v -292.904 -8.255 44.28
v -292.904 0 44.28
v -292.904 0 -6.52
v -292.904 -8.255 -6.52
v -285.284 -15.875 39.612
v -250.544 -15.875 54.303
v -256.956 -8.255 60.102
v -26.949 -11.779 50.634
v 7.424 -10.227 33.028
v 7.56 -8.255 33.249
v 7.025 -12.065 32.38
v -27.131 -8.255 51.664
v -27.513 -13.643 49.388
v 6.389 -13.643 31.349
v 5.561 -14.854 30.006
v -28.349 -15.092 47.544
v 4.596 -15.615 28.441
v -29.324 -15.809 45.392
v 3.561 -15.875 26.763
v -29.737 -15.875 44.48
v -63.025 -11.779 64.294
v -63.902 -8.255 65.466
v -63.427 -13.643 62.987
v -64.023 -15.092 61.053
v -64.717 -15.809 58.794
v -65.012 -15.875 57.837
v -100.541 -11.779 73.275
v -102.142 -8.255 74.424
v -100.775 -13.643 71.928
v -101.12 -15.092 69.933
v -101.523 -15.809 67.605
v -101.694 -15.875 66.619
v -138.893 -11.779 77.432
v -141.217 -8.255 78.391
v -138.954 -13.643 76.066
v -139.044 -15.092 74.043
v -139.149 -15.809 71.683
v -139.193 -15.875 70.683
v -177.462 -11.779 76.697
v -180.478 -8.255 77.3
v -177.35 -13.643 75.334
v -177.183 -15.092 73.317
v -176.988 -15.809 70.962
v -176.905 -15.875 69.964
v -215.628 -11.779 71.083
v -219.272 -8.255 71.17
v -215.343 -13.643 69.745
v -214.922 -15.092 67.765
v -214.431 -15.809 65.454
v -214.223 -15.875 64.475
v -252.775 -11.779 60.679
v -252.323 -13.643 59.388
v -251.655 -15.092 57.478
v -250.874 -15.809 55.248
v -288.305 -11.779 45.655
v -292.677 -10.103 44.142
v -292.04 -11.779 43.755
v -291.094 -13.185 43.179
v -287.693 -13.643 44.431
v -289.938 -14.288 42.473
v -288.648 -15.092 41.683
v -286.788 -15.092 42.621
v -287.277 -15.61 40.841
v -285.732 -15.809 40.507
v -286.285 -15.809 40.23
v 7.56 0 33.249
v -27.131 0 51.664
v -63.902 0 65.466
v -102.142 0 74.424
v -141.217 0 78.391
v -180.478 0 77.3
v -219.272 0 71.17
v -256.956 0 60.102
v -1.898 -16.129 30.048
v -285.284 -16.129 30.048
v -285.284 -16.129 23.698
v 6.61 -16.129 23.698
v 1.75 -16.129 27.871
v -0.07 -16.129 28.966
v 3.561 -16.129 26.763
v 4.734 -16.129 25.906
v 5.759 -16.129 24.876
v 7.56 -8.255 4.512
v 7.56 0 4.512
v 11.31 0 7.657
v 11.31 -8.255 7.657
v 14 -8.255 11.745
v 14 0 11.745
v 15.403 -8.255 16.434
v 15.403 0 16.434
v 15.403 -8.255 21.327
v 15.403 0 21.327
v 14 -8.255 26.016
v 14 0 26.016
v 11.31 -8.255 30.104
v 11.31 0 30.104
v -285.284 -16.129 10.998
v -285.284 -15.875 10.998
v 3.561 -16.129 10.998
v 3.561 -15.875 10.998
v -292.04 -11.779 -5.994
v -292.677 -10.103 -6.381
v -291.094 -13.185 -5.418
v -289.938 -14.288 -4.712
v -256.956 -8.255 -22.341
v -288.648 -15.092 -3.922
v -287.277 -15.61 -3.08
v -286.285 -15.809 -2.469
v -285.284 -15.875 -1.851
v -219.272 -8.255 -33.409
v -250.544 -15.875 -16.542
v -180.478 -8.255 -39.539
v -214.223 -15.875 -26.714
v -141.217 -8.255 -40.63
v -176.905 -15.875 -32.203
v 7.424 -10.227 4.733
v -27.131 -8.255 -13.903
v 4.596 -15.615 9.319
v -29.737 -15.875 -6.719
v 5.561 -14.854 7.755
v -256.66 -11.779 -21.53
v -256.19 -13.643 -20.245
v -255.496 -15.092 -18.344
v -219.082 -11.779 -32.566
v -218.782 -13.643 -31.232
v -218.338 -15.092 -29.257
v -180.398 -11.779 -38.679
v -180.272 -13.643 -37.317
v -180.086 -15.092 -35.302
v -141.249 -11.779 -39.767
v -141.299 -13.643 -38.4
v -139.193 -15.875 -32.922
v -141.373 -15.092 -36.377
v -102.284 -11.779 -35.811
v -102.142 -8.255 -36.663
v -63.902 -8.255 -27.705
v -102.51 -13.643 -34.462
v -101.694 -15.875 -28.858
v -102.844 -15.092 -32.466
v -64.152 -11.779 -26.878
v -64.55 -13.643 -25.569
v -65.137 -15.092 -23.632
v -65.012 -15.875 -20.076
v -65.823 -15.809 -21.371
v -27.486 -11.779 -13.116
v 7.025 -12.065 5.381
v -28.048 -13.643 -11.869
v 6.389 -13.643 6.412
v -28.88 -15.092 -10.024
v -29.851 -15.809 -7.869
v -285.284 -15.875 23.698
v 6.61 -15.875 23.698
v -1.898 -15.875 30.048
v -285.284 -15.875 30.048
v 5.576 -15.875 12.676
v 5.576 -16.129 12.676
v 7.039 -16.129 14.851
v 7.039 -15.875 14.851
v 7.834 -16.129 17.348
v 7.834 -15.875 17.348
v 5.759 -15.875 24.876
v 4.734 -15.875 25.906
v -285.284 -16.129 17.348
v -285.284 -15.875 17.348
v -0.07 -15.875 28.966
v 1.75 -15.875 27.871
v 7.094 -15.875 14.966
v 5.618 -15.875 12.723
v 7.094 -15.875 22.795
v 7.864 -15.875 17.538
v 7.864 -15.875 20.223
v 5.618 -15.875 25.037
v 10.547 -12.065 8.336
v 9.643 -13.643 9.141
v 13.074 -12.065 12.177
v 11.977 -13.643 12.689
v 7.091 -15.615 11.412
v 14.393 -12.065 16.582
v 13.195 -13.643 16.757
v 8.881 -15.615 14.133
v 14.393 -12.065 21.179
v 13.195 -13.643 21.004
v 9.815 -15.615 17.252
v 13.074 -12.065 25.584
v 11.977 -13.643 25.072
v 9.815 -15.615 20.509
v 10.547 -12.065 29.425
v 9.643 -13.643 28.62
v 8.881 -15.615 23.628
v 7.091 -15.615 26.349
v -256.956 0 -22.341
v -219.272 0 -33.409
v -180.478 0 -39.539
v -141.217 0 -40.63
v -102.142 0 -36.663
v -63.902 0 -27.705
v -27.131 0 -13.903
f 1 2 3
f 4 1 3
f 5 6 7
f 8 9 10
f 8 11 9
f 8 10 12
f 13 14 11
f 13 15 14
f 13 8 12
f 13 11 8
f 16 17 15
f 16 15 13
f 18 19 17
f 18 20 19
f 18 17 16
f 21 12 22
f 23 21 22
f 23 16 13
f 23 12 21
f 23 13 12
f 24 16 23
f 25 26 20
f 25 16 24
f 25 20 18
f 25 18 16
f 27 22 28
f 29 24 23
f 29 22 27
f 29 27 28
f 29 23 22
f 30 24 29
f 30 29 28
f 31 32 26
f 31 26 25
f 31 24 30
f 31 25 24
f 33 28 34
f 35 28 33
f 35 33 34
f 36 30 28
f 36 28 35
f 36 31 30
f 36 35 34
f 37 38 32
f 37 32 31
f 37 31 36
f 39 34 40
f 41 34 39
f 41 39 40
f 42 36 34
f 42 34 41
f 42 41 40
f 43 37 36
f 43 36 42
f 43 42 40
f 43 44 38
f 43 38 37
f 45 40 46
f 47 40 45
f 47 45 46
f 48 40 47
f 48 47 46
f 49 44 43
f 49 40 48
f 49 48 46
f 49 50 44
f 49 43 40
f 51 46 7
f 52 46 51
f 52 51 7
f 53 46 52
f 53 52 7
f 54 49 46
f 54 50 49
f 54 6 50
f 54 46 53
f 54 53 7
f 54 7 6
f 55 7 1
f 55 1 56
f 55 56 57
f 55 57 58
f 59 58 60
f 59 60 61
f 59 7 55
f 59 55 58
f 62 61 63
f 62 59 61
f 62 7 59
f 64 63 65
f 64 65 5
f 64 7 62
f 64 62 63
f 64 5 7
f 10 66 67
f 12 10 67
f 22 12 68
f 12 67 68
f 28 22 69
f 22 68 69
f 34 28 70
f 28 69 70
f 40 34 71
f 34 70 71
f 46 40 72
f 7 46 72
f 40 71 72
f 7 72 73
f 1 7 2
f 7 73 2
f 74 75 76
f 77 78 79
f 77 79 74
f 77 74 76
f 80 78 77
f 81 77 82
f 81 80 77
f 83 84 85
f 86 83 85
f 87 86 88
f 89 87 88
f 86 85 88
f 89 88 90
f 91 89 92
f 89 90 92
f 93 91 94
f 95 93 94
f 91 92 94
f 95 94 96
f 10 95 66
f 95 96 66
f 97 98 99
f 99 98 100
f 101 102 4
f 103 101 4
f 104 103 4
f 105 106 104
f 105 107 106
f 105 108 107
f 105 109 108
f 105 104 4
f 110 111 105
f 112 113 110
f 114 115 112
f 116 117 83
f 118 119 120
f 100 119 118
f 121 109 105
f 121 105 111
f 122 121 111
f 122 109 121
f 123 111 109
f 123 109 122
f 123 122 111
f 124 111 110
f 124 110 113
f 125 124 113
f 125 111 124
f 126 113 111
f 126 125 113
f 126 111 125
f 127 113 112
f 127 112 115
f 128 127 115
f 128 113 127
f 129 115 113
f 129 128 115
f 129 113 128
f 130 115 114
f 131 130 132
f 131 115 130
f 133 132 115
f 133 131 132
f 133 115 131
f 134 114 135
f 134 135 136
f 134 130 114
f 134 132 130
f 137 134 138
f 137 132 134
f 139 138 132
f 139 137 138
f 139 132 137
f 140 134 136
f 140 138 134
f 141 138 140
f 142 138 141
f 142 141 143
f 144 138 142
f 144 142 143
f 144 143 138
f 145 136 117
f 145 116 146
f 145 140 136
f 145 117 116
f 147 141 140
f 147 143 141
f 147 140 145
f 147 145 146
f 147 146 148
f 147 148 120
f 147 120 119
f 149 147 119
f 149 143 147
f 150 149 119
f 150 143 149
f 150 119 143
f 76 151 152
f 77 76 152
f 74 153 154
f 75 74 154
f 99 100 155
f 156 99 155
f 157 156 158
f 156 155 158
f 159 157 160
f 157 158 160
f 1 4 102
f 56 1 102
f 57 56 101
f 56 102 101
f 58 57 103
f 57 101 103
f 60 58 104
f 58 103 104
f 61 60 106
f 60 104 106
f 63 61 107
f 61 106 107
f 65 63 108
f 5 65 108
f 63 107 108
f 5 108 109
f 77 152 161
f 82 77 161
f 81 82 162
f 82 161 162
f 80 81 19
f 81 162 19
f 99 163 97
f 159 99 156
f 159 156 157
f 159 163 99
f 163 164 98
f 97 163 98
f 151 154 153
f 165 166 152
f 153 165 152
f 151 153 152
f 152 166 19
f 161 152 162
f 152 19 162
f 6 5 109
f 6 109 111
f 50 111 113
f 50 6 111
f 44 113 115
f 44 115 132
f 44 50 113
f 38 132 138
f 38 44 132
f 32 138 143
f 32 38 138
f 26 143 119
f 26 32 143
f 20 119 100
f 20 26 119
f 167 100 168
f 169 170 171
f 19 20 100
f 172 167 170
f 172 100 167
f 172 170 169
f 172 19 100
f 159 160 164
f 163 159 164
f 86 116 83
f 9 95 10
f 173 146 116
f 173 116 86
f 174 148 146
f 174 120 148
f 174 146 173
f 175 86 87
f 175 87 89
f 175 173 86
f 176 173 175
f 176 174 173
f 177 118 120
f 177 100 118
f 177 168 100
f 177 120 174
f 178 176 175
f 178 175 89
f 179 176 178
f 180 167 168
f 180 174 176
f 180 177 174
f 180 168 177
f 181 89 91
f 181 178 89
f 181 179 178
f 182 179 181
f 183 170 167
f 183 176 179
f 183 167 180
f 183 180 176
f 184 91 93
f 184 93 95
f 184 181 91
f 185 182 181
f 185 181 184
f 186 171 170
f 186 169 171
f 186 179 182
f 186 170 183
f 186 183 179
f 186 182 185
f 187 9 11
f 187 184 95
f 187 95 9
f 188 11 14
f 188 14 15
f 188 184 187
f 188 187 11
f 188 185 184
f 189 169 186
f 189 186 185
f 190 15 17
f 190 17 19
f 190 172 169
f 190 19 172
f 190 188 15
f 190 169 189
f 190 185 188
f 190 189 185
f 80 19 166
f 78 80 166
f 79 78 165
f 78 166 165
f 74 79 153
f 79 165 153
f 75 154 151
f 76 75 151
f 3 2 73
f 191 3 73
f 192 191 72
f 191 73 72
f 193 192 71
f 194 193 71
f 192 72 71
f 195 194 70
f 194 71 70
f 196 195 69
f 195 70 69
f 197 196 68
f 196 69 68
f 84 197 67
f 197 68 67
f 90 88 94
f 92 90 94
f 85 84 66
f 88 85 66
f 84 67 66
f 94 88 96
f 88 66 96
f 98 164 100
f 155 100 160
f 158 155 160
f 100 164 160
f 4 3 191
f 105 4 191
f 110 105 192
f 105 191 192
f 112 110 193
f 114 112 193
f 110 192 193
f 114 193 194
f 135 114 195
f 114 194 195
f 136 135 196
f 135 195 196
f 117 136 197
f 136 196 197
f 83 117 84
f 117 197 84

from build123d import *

# Parameters (mm, degrees)
F1_DEPTH = 15.875
F2_R     = 7.62
F4_DEPTH = 0.254


with BuildPart() as f1:
    # F0 (on Front) → F1 (new body)
    with BuildSketch(Plane.XZ):
        with BuildLine():
            Line((-292.904052, 44.280437), (-292.904052, -6.519563))
            ThreePointArc((-292.904052, -6.519563), (-141.216922, -40.630235), (7.560473, 4.511875))
            ThreePointArc((7.560473, 4.511875), (15.581727, 18.880437), (7.560473, 33.249))
            ThreePointArc((7.560473, 33.249), (-141.216922, 78.391109), (-292.904052, 44.280437))
        make_face()
    extrude(amount=F1_DEPTH)

    # F2
    f2_edges = [f1.edges().sort_by_distance(p)[0] for p in [
        (-292.904052, -15.875, 18.880437),
        (-141.216922, -15.875, -40.630235),
        (15.581727, -15.875, 18.880437),
        (-141.216922, -15.875, 78.391109),
    ]]
    fillet(f2_edges, radius=F2_R)


with BuildPart() as f4:
    # F3 (on face) → F4 (new body)
    with BuildSketch(Plane.XZ.offset(15.875)):
        with BuildLine():
            Line((-285.284052, 30.048192), (-285.284052, 23.698192))
            Line((-285.284052, 23.698192), (6.609736, 23.698192))
            ThreePointArc((6.609736, 23.698192), (5.26691, 25.410789), (3.561461, 26.762683))
            ThreePointArc((3.561461, 26.762683), (0.840677, 28.420068), (-1.897719, 30.048192))
            Line((-1.897719, 30.048192), (-285.284052, 30.048192))
        make_face()
        with BuildLine():
            Line((7.834076, 17.348192), (-285.284052, 17.348192))
            Line((-285.284052, 17.348192), (-285.284052, 10.998192))
            Line((-285.284052, 10.998192), (3.561461, 10.998192))
            ThreePointArc((3.561461, 10.998192), (6.384523, 13.711107), (7.834076, 17.348192))
        make_face()
    extrude(amount=F4_DEPTH)


solid = Compound([f1.part, f4.part])
